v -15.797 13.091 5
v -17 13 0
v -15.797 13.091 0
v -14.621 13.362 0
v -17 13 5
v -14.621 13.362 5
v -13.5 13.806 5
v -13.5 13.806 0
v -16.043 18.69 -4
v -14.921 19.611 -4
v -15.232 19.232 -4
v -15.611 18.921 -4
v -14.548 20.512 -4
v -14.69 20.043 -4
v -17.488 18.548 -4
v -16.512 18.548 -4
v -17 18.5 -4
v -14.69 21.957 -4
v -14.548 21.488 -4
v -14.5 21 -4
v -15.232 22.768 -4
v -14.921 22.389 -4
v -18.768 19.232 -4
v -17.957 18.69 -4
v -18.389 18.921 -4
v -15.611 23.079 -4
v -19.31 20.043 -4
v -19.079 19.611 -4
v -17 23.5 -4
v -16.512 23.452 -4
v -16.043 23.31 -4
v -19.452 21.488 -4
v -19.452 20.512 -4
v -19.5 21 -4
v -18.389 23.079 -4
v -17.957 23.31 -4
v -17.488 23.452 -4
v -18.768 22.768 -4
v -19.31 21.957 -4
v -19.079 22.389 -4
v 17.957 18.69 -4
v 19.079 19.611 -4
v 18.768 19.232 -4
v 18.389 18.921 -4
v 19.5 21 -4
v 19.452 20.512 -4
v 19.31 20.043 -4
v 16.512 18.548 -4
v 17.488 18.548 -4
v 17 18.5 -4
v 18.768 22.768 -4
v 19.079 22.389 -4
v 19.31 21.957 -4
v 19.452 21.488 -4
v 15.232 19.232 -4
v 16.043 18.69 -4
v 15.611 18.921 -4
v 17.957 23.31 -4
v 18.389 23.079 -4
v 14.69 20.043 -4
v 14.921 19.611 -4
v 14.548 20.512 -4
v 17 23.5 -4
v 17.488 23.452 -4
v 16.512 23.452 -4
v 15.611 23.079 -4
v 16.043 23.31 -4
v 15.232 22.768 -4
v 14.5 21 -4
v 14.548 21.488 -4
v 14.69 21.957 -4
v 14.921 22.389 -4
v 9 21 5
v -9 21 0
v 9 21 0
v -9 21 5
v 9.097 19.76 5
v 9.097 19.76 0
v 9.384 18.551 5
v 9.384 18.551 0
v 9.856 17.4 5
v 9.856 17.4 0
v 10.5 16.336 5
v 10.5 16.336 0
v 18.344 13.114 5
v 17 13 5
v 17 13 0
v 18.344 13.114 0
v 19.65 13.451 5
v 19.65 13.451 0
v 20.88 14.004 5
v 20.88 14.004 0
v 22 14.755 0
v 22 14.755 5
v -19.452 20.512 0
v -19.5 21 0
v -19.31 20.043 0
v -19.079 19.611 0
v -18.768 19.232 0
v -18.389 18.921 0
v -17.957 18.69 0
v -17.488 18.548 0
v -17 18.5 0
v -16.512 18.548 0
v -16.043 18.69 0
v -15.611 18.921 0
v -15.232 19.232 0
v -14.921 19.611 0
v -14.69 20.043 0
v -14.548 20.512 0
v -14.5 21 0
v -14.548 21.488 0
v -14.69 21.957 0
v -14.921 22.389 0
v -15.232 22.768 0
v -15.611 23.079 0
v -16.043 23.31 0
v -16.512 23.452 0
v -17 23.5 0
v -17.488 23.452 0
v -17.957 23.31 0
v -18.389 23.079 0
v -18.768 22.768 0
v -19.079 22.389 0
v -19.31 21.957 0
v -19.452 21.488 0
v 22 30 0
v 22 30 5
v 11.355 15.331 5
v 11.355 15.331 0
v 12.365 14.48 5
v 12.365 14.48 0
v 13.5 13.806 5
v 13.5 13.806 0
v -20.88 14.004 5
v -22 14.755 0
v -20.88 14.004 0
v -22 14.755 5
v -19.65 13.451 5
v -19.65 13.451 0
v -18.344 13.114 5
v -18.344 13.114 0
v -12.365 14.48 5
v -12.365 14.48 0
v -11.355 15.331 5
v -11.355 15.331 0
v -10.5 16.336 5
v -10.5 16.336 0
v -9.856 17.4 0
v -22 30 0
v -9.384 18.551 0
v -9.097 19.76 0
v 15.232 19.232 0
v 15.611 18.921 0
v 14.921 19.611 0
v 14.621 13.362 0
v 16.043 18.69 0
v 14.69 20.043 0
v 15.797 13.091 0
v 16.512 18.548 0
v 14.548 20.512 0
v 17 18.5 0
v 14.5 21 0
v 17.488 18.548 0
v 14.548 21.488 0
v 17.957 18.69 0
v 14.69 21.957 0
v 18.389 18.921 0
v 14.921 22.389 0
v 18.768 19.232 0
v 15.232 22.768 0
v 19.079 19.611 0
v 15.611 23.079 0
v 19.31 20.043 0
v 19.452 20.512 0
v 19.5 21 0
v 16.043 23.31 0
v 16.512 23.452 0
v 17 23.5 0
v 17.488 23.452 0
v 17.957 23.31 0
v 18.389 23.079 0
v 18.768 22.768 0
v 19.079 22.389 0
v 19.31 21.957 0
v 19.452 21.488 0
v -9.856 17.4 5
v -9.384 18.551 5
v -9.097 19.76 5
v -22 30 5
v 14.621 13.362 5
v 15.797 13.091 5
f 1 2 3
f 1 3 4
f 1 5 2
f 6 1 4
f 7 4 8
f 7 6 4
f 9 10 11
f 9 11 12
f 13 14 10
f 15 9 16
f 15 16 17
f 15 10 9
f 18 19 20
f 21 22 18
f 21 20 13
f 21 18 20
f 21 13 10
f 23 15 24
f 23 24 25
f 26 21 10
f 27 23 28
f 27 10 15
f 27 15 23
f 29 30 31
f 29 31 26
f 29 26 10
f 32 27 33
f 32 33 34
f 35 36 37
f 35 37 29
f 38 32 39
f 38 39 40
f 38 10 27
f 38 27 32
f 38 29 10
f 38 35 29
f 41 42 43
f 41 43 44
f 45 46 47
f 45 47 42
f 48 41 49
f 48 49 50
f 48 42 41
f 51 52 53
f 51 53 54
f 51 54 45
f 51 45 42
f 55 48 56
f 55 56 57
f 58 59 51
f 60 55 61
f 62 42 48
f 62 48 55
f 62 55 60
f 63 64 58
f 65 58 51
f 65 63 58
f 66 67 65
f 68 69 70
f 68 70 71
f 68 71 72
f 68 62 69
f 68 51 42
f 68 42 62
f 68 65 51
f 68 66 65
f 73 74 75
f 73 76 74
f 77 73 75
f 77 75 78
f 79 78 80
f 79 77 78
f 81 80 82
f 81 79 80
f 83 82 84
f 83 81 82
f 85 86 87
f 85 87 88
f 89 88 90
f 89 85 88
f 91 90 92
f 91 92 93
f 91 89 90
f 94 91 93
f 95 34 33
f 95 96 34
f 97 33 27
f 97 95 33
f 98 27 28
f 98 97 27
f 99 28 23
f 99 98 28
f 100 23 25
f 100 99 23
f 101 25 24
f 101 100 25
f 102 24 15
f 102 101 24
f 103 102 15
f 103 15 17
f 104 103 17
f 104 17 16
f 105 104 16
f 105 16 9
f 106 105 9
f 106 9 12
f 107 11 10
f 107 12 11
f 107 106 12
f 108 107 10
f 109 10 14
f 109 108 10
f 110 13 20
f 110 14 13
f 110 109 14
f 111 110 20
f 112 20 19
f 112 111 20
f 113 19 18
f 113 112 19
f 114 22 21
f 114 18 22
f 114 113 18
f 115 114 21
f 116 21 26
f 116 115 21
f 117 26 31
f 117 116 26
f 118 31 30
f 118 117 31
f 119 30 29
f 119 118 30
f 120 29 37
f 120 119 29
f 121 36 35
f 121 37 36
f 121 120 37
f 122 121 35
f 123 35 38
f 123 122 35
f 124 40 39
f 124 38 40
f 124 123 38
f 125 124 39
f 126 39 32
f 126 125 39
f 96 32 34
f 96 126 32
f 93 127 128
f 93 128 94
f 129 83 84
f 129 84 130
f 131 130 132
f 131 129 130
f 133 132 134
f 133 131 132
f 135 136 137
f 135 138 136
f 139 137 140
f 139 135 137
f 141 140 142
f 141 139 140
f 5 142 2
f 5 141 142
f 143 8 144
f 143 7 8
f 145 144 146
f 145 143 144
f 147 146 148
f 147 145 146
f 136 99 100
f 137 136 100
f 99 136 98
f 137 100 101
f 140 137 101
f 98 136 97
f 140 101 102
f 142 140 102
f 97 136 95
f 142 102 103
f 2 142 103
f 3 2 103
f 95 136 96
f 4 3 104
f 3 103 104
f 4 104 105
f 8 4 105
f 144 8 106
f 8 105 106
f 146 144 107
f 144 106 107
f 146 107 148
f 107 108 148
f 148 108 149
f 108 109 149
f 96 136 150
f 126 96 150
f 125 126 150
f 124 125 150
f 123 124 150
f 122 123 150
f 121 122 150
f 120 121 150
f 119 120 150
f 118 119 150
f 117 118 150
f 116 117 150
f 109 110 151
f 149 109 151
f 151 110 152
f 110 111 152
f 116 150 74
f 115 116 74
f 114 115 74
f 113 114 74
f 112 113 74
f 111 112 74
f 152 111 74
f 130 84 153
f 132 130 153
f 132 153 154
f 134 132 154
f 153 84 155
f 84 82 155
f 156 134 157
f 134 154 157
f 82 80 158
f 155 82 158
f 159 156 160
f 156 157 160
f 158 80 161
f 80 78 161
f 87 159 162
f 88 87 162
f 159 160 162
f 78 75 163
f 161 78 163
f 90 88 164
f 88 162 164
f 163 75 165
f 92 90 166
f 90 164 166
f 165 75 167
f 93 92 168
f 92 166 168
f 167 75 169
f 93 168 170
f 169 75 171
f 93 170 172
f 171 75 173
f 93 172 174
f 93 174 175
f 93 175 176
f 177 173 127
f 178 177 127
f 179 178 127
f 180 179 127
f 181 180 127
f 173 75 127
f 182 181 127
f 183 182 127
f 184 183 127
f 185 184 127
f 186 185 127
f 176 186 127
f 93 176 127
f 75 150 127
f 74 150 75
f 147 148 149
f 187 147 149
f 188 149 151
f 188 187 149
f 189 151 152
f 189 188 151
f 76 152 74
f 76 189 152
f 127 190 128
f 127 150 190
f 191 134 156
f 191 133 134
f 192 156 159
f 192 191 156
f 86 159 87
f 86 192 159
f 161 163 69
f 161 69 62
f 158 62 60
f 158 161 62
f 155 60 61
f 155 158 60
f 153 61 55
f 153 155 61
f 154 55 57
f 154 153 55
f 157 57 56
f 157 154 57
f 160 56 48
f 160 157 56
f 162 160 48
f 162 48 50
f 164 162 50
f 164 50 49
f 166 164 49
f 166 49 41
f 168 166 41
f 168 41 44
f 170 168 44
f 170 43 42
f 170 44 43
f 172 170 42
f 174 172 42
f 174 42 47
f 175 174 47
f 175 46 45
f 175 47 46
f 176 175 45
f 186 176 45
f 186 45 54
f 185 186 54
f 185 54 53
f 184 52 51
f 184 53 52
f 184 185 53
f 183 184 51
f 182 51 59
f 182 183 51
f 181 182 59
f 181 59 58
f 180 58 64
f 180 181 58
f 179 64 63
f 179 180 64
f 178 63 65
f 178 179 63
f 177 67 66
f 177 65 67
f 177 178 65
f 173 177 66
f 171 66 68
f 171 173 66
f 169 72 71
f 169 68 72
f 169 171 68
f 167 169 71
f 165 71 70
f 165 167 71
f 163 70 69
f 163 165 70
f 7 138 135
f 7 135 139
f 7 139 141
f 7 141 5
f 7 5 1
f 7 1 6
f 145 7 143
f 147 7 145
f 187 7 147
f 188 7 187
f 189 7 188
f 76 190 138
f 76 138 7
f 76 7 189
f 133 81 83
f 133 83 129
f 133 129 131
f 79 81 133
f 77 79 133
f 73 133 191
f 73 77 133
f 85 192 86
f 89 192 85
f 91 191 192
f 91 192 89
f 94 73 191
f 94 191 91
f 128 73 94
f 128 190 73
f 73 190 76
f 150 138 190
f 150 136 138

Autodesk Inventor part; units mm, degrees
ref_plane "YZ Plane" through (0, 0, 0) normal (1, 0, 0) x (0, 1, 0)
ref_plane "XZ Plane" through (0, 0, 0) normal (0, 1, 0) x (-1, 0, 0)
sketch "スケッチ1" plane through (0, 0, 0) normal (0, 0, 1) x (1, 0, 0)
  line L0 (-22, 30) -> (22, 30)
  line L1 (22, 30) -> (22, 0)
  line L2 (22, 0) -> (-22, 0)
  line L3 (-22, 0) -> (-22, 30)
  point P0 (0, 0)
  point P1 (0, 0)
  dimension "d0" = 30
  dimension "d1" = 44
extrude "押し出し1" add sketch "スケッチ1" along normal blind 5
sketch "スケッチ2" plane through (0, 0, 5) normal (0, 0, 1) x (1, 0, 0)
  arc A0 (-17, 13) -> (-13.5, 13.8063) centre (-17, 21) ccw
  arc A1 (-10.5, 16.3363) -> (-9, 21) centre (-17, 21) ccw
  line L0 (-7.5, 21) -> (-9, 21)
  line L1 (-1.5, 21) -> (-4.5, 21)
  arc A2 (9, 21) -> (10.5, 16.3363) centre (17, 21) ccw
  arc A3 (13.5, 13.8063) -> (17, 13) centre (17, 21) ccw
  circle A4 centre (-17, 21) radius 8
  circle A5 centre (17, 21) radius 8
  line L2 (-9, 21) -> (9, 21)
  line L3 (-22, 0) -> (22, 0)
  line L4 (22, 0) -> (22, 30)
  line L5 (22, 30) -> (-22, 30)
  line L6 (-22, 30) -> (-22, 0)
  point P0 (0, 0)
  point P1 (22, 14.755)
  point P2 (17, 13)
  point P3 (10.5, 16.3363)
  point P4 (-13.5, 13.8063)
  point P5 (-17, 13)
  point P6 (-22, 14.755)
extrude "押し出し2" cut sketch "スケッチ2" against normal through all contours A0 A4 A1 L0 L2 L1 A2 A5 A3 L4 L3 L6
sketch "スケッチ3" plane through (0, 0, 0) normal (0, 0, -1) x (-1, 0, 0)
  circle A0 centre (-17, 21) radius 3 projected
  circle A1 centre (17, 21) radius 3 projected
  circle A2 centre (-17, 21) radius 2.5
  circle A3 centre (17, 21) radius 2.5
  point P0 (0, 0)
  point P1 (-14.9, 18.325)
  dimension "d6" = 5
  dimension "d7" = 5
ref_plane "作業平面1" through (-20, -16, -4) normal (0, 0, 1) x (1, 0, 0)
extrude "押し出し3" add sketch "スケッチ3" along normal up to surface (4 mm away) contours A2 | A3
properties part number "board_setter_upper"
